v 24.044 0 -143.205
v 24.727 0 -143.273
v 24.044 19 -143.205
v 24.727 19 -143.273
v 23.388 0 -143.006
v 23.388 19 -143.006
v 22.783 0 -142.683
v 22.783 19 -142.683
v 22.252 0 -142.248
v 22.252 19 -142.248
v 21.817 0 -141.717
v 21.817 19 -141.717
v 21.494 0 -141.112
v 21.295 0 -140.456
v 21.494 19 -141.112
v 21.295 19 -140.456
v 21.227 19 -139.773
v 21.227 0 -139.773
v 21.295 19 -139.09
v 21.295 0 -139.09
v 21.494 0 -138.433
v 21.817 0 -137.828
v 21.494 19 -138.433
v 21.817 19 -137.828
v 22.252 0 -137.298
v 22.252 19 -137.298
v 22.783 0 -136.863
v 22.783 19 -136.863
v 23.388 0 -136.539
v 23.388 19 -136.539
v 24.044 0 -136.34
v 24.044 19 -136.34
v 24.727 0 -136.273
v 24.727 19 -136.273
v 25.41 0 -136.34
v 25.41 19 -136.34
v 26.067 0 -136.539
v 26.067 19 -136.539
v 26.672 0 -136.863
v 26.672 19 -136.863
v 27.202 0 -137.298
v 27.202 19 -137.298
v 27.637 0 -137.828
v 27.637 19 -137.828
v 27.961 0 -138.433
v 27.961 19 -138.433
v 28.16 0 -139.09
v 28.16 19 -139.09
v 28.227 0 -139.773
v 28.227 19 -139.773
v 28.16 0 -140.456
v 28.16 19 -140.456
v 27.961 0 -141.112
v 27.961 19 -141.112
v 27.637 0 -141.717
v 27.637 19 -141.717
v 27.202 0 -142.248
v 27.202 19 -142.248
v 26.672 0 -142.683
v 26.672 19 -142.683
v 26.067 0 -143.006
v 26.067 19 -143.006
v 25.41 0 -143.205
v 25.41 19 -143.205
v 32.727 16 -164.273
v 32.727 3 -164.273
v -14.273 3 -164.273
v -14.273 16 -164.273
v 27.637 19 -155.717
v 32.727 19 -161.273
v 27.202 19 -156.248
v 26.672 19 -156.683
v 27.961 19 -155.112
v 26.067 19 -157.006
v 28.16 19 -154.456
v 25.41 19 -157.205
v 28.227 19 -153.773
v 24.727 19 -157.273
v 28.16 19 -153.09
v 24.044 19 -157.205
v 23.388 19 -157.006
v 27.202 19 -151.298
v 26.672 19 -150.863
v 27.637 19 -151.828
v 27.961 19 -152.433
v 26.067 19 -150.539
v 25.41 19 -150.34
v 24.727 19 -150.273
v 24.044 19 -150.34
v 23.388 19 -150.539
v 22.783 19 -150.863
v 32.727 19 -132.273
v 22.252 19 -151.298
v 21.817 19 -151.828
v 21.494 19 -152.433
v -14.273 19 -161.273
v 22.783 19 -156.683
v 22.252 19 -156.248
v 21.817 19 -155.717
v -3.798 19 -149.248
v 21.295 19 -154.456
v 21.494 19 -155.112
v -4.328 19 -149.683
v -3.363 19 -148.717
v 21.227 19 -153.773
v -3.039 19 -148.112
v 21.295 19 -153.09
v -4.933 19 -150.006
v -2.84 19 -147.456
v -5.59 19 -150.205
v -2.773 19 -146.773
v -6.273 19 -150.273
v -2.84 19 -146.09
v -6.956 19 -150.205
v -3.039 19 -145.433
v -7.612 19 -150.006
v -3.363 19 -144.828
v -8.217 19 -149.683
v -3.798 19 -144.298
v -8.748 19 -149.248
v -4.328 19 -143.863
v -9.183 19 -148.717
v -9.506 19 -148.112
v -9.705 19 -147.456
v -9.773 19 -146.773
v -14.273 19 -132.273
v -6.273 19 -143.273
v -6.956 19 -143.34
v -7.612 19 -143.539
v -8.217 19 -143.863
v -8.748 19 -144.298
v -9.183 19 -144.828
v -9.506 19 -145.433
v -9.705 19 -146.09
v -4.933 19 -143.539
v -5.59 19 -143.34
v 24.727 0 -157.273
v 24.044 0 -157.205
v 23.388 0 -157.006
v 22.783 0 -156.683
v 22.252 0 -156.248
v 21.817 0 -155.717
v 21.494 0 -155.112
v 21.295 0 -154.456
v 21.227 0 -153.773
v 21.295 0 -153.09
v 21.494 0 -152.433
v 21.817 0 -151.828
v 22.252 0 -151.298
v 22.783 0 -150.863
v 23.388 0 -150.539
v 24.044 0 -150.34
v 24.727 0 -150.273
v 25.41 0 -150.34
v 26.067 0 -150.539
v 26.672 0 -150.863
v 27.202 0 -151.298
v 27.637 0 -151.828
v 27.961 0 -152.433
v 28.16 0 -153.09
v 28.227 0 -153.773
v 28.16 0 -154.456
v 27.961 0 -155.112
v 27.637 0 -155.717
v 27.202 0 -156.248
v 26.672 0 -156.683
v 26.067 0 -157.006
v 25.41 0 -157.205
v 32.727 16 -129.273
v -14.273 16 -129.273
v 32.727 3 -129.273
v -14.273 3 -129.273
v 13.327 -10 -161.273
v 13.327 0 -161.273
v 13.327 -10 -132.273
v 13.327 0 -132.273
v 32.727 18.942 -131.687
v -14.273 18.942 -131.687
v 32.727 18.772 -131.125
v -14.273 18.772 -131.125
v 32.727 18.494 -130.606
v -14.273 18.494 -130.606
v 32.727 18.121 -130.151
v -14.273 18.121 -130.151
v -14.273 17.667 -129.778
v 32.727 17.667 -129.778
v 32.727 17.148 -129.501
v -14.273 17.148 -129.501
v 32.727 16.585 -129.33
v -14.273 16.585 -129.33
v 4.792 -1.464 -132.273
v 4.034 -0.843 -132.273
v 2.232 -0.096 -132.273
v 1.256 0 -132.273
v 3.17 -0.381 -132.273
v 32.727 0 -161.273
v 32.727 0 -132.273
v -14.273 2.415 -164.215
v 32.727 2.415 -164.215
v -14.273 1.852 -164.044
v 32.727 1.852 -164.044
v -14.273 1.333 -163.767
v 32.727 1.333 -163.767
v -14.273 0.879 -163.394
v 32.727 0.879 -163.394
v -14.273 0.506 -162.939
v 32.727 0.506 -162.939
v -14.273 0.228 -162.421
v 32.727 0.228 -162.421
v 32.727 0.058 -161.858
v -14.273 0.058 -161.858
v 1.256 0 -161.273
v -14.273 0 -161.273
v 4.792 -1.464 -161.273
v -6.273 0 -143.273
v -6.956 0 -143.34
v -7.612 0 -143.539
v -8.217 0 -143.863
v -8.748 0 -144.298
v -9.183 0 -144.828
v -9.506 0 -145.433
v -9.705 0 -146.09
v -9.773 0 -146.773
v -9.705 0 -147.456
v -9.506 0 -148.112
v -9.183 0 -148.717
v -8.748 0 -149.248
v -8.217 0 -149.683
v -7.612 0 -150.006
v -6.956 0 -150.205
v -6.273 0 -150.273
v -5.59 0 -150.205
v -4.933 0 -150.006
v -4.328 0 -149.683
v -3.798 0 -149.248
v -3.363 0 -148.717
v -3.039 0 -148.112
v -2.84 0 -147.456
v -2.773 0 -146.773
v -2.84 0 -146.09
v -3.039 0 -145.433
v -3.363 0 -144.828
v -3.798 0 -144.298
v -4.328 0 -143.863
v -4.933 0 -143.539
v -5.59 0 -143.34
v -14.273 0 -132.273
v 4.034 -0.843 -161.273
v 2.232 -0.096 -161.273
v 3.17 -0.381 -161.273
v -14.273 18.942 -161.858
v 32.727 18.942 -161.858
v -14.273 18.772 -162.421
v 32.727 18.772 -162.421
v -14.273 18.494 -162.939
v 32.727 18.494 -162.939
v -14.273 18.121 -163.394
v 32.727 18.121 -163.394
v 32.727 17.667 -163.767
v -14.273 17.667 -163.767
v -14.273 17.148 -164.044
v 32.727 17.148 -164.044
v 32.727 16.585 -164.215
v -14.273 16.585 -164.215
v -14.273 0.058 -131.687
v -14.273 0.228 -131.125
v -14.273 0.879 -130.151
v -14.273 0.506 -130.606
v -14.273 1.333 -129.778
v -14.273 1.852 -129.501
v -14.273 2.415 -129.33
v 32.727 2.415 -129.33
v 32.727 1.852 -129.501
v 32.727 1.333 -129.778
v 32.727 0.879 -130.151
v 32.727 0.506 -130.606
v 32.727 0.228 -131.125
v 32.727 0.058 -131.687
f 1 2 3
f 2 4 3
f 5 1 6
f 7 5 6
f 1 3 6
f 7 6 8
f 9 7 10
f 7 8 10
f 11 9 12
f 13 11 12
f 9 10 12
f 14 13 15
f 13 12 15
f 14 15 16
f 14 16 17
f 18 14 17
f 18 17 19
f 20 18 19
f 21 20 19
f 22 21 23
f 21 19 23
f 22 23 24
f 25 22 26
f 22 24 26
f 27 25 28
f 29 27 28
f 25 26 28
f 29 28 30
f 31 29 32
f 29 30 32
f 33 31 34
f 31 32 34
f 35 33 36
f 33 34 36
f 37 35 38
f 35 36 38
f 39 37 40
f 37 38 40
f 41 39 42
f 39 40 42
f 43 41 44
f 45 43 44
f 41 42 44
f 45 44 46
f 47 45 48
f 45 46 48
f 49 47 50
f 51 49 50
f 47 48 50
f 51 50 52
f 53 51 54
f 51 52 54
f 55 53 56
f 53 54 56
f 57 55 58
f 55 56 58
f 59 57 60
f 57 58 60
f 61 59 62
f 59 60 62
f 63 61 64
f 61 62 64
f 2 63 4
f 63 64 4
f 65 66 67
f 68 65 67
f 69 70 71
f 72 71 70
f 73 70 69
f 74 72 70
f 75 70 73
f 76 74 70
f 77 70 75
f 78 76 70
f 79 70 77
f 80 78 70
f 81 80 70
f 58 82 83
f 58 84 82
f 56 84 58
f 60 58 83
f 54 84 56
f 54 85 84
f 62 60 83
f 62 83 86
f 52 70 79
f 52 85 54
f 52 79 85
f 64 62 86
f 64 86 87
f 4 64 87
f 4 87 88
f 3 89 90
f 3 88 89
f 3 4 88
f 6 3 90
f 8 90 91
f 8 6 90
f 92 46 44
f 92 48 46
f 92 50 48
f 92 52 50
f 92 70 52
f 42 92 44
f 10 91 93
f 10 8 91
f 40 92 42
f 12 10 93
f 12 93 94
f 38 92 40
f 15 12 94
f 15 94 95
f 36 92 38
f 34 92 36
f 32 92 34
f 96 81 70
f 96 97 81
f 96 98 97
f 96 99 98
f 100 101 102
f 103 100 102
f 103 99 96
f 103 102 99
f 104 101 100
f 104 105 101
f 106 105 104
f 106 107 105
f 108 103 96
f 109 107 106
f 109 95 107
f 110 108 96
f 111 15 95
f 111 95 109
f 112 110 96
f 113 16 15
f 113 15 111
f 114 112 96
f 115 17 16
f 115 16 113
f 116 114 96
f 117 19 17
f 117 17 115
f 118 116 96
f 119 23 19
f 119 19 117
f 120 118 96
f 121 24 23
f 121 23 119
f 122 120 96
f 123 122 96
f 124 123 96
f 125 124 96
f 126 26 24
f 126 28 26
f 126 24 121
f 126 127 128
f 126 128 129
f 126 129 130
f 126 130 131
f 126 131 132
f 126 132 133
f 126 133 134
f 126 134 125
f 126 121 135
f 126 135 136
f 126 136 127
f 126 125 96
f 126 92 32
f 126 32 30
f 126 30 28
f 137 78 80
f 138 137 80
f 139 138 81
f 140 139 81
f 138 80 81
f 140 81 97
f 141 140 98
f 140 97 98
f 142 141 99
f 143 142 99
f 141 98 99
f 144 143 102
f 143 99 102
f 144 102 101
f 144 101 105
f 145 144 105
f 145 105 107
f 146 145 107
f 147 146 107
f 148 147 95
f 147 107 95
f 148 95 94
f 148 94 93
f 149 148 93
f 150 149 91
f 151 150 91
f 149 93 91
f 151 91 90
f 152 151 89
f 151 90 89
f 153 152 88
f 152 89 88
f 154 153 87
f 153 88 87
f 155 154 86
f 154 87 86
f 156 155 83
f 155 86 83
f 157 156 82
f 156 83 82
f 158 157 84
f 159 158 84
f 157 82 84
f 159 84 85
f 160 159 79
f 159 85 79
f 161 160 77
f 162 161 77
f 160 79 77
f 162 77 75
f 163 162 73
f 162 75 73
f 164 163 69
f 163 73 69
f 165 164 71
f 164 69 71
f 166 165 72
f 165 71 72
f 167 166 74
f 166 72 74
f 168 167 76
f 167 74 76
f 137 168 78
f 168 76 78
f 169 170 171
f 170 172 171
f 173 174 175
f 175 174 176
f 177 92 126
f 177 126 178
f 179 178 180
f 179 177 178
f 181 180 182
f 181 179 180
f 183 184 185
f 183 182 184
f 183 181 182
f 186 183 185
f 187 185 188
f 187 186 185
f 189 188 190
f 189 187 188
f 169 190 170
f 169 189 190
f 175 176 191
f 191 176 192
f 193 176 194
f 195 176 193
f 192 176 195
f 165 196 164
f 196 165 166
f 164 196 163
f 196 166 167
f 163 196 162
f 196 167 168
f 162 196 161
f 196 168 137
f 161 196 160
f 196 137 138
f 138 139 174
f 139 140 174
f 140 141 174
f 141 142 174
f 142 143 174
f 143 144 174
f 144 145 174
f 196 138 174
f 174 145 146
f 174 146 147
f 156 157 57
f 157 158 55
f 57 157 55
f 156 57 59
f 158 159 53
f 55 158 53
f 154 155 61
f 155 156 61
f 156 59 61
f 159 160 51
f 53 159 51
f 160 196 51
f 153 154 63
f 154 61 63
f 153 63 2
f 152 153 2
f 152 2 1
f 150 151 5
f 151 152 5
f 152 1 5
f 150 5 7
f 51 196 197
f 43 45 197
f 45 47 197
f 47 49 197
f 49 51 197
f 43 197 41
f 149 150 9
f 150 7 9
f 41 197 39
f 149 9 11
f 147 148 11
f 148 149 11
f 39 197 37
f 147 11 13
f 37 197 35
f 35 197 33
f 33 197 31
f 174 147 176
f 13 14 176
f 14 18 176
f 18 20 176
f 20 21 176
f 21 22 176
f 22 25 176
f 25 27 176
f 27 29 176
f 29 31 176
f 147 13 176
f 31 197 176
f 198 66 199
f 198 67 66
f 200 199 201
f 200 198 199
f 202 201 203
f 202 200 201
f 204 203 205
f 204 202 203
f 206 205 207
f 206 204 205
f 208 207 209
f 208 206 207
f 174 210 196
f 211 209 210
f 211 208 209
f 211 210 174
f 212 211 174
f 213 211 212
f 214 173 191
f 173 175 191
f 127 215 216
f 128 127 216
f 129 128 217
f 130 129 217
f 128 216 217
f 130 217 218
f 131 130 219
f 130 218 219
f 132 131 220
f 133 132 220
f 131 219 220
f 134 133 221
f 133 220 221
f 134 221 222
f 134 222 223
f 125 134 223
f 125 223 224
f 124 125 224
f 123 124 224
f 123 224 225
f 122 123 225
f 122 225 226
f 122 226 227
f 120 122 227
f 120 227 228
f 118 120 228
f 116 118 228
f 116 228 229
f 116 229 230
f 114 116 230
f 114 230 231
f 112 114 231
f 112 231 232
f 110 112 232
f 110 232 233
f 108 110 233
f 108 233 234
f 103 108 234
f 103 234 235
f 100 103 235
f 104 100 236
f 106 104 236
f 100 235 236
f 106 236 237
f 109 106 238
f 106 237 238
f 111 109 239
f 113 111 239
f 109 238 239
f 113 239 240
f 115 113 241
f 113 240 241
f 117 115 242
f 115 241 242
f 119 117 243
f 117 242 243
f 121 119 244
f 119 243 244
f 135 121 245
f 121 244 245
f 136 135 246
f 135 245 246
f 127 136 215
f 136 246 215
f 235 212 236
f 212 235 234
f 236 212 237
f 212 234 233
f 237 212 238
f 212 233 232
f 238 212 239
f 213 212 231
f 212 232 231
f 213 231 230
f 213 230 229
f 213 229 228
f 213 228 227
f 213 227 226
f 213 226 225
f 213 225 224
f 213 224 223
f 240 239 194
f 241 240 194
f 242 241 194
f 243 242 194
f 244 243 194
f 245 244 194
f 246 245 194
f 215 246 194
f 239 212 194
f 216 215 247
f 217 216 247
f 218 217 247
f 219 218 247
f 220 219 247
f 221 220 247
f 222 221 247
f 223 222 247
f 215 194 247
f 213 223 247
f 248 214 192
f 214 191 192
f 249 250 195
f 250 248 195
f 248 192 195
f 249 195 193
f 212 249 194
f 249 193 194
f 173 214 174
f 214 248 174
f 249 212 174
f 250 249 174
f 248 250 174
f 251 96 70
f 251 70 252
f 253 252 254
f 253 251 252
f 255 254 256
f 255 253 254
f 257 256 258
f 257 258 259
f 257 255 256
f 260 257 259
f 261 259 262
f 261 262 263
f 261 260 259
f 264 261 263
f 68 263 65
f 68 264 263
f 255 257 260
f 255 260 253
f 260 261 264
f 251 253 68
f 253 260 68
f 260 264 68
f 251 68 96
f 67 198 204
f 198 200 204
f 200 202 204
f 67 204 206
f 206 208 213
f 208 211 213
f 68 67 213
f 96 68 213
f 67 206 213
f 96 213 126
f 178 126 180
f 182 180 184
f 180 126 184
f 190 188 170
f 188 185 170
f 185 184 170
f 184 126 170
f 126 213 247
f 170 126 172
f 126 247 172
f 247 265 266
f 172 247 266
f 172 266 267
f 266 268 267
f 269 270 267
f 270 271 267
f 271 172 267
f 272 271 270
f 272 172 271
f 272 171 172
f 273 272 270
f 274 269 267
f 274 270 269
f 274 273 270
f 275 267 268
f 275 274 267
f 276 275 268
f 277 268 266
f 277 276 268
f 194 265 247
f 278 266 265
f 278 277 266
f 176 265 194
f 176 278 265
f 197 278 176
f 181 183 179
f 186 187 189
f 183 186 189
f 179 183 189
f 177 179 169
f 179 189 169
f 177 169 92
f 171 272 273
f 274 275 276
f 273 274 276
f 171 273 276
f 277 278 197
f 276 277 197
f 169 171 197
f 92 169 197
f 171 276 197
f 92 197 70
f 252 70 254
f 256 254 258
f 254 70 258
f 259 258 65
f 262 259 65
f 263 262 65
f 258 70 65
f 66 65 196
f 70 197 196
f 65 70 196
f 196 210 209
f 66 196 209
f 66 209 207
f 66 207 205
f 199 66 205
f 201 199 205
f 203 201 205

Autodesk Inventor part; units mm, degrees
ref_plane "YZ Plane" through (0, 0, 0) normal (1, 0, 0) x (0, 1, 0)
ref_plane "XZ Plane" through (0, 0, 0) normal (0, 1, 0) x (-1, 0, 0)
ref_plane "XY Plane" through (0, 0, 0) normal (0, 0, 1) x (1, 0, 0)
sketch "Schizzo1" plane through (0, 0, 0) normal (0, 1, 0) x (-1, 0, 0)
  line L0 (14.2727, -129.2727) -> (-32.7273, -129.2727)
  line L1 (-32.7273, -129.2727) -> (-32.7273, -164.2727)
  line L2 (-32.7273, -164.2727) -> (14.2727, -164.2727)
  line L3 (14.2727, -164.2727) -> (14.2727, -129.2727)
  line L4 (14.2727, -129.2727) -> (-32.7273, -164.2727) construction
  line L5 (-32.7273, -129.2727) -> (14.2727, -164.2727) construction
  point P0 (0, 0)
  point P1 (-9.2273, -146.7727)
  dimension "d0" = 35
  dimension "d1" = 47
extrude "Estrusione1" add sketch "Schizzo1" along normal blind 19
sketch "Schizzo2" plane through (0, 0, 0) normal (0, -1, 0) x (1, 0, 0)
  line L0 (-14.2727, -129.2727) -> (32.7273, -129.2727) projected
  line L1 (32.7273, -129.2727) -> (32.7273, -164.2727) projected
  line L2 (32.7273, -129.2727) -> (32.7273, -164.2727)
  line L3 (32.7273, -146.7727) -> (24.7273, -146.7727)
  line L4 (32.7273, -146.7727) -> (24.7273, -146.7727) construction
  line L5 (24.7273, -146.7727) -> (52.7273, -146.7727) construction
  line L6 (24.7273, -146.7727) -> (24.7273, -153.7727)
  line L7 (24.7273, -146.7727) -> (31.7273, -146.7727) construction
  line L8 (24.7273, -146.7727) -> (24.7273, -139.7727)
  line L9 (24.7273, -146.7727) -> (31.7273, -146.7727) construction
  point P0 (0, 0)
  point P1 (0.7273, -147.0727)
  dimension "d4" = 8
  dimension "d5" = 180
  dimension "d19" = 7
  dimension "d20" = 90
  dimension "d21" = 7
  dimension "d22" = 90
hole "Foro1" at (24.7273, 0, -139.7727) at (24.7273, 0, -153.7727) direction (0, 1, 0) diameter 7 end through all clearance for "Vite a testa piana" size "M6" standard "ANSI - Profilo M Metrico"
fillet "Raccordo1" radius 3 1 edges at (9.2273, 19, -129.2727)
fillet "Raccordo2" radius 3 1 edges at (9.2273, 19, -164.2727)
fillet "Raccordo3" radius 3 1 edges at (9.2273, 0, -164.2727)
fillet "Raccordo4" radius 3 1 edges at (9.2273, 0, -129.2727)
sketch "Schizzo3" plane through (0, 19, 0) normal (0, 1, 0) x (1, 0, 0)
  line L0 (32.7273, 146.7727) -> (-6.2727, 146.7727)
  line L1 (32.7273, 146.7727) -> (71.7273, 146.7727) construction
  line L2 (32.7273, 132.2727) -> (32.7273, 161.2727) projected
  point P0 (0, 0)
  dimension "d23" = 39
  dimension "d24" = 180
hole "Foro2" at (-6.2727, 19, -146.7727) direction (0, -1, 0) diameter 7 end through all clearance for "Vite a testa piana" size "M6" standard "ANSI - Profilo M Metrico"
sketch "Schizzo4" plane through (0, 0, 0) normal (0, -1, 0) x (1, 0, 0)
  line L0 (32.7273, -132.2727) -> (32.7273, -161.2727) projected
  line L1 (8, -215) -> (39.6, -215) construction
  line L2 (13.3273, -161.2727) -> (13.3273, -132.2727)
  line L3 (13.3273, -161.2727) -> (13.3273, -132.2727)
  line L4 (13.3273, -132.2727) -> (3.3273, -132.2727)
  line L5 (3.3273, -132.2727) -> (3.3273, -161.2727)
  line L6 (3.3273, -161.2727) -> (13.3273, -161.2727)
  line L7 (32.7273, -132.2727) -> (-14.2727, -132.2727) projected
  line L8 (78, -150) -> (86, -150) construction
  line L9 (32.7273, -146.7727) -> (24.7273, -146.7727)
  line L10 (32.7273, -146.7727) -> (40.7273, -146.7727) construction
  line L11 (24.7273, -146.7727) -> (13.3273, -146.7727)
  line L12 (24.7273, -146.7727) -> (36.1273, -146.7727) construction
  point P0 (0, 0)
  dimension "d35" = 29
  dimension "d36" = 10
  dimension "d44" = 8
  dimension "d45" = 180
  dimension "d46" = 11.4
  dimension "d47" = 180
extrude "Estrusione2" add sketch "Schizzo4" along normal blind 10 contours L2 L6 L5 L4
sketch "Schizzo5" plane through (3.3273, 0, -132.2727) normal (0, 0, 1) x (1, 0, 0)
  line L0 (10, 0) -> (10, -10) projected
  line L1 (10, 0) -> (0, 0) projected
  line L2 (10, -10) -> (0, 0)
  line L3 (0, -10) -> (10, -10) projected
  line L4 (0, 0) -> (0, -10) projected
  line L5 (10, -10) -> (0, -10)
  line L6 (0, -10) -> (0, 0)
  point P0 (-3.3273, 0)
extrude "Estrusione3" cut sketch "Schizzo5" against normal through all contours L3 L4 L2
fillet "Raccordo5" radius 5 1 edges at (3.3273, 0, -146.7727)
properties part number "22_Blocco_Escursione_Braccio" material "PLA(Stampato)(D0,646)"
